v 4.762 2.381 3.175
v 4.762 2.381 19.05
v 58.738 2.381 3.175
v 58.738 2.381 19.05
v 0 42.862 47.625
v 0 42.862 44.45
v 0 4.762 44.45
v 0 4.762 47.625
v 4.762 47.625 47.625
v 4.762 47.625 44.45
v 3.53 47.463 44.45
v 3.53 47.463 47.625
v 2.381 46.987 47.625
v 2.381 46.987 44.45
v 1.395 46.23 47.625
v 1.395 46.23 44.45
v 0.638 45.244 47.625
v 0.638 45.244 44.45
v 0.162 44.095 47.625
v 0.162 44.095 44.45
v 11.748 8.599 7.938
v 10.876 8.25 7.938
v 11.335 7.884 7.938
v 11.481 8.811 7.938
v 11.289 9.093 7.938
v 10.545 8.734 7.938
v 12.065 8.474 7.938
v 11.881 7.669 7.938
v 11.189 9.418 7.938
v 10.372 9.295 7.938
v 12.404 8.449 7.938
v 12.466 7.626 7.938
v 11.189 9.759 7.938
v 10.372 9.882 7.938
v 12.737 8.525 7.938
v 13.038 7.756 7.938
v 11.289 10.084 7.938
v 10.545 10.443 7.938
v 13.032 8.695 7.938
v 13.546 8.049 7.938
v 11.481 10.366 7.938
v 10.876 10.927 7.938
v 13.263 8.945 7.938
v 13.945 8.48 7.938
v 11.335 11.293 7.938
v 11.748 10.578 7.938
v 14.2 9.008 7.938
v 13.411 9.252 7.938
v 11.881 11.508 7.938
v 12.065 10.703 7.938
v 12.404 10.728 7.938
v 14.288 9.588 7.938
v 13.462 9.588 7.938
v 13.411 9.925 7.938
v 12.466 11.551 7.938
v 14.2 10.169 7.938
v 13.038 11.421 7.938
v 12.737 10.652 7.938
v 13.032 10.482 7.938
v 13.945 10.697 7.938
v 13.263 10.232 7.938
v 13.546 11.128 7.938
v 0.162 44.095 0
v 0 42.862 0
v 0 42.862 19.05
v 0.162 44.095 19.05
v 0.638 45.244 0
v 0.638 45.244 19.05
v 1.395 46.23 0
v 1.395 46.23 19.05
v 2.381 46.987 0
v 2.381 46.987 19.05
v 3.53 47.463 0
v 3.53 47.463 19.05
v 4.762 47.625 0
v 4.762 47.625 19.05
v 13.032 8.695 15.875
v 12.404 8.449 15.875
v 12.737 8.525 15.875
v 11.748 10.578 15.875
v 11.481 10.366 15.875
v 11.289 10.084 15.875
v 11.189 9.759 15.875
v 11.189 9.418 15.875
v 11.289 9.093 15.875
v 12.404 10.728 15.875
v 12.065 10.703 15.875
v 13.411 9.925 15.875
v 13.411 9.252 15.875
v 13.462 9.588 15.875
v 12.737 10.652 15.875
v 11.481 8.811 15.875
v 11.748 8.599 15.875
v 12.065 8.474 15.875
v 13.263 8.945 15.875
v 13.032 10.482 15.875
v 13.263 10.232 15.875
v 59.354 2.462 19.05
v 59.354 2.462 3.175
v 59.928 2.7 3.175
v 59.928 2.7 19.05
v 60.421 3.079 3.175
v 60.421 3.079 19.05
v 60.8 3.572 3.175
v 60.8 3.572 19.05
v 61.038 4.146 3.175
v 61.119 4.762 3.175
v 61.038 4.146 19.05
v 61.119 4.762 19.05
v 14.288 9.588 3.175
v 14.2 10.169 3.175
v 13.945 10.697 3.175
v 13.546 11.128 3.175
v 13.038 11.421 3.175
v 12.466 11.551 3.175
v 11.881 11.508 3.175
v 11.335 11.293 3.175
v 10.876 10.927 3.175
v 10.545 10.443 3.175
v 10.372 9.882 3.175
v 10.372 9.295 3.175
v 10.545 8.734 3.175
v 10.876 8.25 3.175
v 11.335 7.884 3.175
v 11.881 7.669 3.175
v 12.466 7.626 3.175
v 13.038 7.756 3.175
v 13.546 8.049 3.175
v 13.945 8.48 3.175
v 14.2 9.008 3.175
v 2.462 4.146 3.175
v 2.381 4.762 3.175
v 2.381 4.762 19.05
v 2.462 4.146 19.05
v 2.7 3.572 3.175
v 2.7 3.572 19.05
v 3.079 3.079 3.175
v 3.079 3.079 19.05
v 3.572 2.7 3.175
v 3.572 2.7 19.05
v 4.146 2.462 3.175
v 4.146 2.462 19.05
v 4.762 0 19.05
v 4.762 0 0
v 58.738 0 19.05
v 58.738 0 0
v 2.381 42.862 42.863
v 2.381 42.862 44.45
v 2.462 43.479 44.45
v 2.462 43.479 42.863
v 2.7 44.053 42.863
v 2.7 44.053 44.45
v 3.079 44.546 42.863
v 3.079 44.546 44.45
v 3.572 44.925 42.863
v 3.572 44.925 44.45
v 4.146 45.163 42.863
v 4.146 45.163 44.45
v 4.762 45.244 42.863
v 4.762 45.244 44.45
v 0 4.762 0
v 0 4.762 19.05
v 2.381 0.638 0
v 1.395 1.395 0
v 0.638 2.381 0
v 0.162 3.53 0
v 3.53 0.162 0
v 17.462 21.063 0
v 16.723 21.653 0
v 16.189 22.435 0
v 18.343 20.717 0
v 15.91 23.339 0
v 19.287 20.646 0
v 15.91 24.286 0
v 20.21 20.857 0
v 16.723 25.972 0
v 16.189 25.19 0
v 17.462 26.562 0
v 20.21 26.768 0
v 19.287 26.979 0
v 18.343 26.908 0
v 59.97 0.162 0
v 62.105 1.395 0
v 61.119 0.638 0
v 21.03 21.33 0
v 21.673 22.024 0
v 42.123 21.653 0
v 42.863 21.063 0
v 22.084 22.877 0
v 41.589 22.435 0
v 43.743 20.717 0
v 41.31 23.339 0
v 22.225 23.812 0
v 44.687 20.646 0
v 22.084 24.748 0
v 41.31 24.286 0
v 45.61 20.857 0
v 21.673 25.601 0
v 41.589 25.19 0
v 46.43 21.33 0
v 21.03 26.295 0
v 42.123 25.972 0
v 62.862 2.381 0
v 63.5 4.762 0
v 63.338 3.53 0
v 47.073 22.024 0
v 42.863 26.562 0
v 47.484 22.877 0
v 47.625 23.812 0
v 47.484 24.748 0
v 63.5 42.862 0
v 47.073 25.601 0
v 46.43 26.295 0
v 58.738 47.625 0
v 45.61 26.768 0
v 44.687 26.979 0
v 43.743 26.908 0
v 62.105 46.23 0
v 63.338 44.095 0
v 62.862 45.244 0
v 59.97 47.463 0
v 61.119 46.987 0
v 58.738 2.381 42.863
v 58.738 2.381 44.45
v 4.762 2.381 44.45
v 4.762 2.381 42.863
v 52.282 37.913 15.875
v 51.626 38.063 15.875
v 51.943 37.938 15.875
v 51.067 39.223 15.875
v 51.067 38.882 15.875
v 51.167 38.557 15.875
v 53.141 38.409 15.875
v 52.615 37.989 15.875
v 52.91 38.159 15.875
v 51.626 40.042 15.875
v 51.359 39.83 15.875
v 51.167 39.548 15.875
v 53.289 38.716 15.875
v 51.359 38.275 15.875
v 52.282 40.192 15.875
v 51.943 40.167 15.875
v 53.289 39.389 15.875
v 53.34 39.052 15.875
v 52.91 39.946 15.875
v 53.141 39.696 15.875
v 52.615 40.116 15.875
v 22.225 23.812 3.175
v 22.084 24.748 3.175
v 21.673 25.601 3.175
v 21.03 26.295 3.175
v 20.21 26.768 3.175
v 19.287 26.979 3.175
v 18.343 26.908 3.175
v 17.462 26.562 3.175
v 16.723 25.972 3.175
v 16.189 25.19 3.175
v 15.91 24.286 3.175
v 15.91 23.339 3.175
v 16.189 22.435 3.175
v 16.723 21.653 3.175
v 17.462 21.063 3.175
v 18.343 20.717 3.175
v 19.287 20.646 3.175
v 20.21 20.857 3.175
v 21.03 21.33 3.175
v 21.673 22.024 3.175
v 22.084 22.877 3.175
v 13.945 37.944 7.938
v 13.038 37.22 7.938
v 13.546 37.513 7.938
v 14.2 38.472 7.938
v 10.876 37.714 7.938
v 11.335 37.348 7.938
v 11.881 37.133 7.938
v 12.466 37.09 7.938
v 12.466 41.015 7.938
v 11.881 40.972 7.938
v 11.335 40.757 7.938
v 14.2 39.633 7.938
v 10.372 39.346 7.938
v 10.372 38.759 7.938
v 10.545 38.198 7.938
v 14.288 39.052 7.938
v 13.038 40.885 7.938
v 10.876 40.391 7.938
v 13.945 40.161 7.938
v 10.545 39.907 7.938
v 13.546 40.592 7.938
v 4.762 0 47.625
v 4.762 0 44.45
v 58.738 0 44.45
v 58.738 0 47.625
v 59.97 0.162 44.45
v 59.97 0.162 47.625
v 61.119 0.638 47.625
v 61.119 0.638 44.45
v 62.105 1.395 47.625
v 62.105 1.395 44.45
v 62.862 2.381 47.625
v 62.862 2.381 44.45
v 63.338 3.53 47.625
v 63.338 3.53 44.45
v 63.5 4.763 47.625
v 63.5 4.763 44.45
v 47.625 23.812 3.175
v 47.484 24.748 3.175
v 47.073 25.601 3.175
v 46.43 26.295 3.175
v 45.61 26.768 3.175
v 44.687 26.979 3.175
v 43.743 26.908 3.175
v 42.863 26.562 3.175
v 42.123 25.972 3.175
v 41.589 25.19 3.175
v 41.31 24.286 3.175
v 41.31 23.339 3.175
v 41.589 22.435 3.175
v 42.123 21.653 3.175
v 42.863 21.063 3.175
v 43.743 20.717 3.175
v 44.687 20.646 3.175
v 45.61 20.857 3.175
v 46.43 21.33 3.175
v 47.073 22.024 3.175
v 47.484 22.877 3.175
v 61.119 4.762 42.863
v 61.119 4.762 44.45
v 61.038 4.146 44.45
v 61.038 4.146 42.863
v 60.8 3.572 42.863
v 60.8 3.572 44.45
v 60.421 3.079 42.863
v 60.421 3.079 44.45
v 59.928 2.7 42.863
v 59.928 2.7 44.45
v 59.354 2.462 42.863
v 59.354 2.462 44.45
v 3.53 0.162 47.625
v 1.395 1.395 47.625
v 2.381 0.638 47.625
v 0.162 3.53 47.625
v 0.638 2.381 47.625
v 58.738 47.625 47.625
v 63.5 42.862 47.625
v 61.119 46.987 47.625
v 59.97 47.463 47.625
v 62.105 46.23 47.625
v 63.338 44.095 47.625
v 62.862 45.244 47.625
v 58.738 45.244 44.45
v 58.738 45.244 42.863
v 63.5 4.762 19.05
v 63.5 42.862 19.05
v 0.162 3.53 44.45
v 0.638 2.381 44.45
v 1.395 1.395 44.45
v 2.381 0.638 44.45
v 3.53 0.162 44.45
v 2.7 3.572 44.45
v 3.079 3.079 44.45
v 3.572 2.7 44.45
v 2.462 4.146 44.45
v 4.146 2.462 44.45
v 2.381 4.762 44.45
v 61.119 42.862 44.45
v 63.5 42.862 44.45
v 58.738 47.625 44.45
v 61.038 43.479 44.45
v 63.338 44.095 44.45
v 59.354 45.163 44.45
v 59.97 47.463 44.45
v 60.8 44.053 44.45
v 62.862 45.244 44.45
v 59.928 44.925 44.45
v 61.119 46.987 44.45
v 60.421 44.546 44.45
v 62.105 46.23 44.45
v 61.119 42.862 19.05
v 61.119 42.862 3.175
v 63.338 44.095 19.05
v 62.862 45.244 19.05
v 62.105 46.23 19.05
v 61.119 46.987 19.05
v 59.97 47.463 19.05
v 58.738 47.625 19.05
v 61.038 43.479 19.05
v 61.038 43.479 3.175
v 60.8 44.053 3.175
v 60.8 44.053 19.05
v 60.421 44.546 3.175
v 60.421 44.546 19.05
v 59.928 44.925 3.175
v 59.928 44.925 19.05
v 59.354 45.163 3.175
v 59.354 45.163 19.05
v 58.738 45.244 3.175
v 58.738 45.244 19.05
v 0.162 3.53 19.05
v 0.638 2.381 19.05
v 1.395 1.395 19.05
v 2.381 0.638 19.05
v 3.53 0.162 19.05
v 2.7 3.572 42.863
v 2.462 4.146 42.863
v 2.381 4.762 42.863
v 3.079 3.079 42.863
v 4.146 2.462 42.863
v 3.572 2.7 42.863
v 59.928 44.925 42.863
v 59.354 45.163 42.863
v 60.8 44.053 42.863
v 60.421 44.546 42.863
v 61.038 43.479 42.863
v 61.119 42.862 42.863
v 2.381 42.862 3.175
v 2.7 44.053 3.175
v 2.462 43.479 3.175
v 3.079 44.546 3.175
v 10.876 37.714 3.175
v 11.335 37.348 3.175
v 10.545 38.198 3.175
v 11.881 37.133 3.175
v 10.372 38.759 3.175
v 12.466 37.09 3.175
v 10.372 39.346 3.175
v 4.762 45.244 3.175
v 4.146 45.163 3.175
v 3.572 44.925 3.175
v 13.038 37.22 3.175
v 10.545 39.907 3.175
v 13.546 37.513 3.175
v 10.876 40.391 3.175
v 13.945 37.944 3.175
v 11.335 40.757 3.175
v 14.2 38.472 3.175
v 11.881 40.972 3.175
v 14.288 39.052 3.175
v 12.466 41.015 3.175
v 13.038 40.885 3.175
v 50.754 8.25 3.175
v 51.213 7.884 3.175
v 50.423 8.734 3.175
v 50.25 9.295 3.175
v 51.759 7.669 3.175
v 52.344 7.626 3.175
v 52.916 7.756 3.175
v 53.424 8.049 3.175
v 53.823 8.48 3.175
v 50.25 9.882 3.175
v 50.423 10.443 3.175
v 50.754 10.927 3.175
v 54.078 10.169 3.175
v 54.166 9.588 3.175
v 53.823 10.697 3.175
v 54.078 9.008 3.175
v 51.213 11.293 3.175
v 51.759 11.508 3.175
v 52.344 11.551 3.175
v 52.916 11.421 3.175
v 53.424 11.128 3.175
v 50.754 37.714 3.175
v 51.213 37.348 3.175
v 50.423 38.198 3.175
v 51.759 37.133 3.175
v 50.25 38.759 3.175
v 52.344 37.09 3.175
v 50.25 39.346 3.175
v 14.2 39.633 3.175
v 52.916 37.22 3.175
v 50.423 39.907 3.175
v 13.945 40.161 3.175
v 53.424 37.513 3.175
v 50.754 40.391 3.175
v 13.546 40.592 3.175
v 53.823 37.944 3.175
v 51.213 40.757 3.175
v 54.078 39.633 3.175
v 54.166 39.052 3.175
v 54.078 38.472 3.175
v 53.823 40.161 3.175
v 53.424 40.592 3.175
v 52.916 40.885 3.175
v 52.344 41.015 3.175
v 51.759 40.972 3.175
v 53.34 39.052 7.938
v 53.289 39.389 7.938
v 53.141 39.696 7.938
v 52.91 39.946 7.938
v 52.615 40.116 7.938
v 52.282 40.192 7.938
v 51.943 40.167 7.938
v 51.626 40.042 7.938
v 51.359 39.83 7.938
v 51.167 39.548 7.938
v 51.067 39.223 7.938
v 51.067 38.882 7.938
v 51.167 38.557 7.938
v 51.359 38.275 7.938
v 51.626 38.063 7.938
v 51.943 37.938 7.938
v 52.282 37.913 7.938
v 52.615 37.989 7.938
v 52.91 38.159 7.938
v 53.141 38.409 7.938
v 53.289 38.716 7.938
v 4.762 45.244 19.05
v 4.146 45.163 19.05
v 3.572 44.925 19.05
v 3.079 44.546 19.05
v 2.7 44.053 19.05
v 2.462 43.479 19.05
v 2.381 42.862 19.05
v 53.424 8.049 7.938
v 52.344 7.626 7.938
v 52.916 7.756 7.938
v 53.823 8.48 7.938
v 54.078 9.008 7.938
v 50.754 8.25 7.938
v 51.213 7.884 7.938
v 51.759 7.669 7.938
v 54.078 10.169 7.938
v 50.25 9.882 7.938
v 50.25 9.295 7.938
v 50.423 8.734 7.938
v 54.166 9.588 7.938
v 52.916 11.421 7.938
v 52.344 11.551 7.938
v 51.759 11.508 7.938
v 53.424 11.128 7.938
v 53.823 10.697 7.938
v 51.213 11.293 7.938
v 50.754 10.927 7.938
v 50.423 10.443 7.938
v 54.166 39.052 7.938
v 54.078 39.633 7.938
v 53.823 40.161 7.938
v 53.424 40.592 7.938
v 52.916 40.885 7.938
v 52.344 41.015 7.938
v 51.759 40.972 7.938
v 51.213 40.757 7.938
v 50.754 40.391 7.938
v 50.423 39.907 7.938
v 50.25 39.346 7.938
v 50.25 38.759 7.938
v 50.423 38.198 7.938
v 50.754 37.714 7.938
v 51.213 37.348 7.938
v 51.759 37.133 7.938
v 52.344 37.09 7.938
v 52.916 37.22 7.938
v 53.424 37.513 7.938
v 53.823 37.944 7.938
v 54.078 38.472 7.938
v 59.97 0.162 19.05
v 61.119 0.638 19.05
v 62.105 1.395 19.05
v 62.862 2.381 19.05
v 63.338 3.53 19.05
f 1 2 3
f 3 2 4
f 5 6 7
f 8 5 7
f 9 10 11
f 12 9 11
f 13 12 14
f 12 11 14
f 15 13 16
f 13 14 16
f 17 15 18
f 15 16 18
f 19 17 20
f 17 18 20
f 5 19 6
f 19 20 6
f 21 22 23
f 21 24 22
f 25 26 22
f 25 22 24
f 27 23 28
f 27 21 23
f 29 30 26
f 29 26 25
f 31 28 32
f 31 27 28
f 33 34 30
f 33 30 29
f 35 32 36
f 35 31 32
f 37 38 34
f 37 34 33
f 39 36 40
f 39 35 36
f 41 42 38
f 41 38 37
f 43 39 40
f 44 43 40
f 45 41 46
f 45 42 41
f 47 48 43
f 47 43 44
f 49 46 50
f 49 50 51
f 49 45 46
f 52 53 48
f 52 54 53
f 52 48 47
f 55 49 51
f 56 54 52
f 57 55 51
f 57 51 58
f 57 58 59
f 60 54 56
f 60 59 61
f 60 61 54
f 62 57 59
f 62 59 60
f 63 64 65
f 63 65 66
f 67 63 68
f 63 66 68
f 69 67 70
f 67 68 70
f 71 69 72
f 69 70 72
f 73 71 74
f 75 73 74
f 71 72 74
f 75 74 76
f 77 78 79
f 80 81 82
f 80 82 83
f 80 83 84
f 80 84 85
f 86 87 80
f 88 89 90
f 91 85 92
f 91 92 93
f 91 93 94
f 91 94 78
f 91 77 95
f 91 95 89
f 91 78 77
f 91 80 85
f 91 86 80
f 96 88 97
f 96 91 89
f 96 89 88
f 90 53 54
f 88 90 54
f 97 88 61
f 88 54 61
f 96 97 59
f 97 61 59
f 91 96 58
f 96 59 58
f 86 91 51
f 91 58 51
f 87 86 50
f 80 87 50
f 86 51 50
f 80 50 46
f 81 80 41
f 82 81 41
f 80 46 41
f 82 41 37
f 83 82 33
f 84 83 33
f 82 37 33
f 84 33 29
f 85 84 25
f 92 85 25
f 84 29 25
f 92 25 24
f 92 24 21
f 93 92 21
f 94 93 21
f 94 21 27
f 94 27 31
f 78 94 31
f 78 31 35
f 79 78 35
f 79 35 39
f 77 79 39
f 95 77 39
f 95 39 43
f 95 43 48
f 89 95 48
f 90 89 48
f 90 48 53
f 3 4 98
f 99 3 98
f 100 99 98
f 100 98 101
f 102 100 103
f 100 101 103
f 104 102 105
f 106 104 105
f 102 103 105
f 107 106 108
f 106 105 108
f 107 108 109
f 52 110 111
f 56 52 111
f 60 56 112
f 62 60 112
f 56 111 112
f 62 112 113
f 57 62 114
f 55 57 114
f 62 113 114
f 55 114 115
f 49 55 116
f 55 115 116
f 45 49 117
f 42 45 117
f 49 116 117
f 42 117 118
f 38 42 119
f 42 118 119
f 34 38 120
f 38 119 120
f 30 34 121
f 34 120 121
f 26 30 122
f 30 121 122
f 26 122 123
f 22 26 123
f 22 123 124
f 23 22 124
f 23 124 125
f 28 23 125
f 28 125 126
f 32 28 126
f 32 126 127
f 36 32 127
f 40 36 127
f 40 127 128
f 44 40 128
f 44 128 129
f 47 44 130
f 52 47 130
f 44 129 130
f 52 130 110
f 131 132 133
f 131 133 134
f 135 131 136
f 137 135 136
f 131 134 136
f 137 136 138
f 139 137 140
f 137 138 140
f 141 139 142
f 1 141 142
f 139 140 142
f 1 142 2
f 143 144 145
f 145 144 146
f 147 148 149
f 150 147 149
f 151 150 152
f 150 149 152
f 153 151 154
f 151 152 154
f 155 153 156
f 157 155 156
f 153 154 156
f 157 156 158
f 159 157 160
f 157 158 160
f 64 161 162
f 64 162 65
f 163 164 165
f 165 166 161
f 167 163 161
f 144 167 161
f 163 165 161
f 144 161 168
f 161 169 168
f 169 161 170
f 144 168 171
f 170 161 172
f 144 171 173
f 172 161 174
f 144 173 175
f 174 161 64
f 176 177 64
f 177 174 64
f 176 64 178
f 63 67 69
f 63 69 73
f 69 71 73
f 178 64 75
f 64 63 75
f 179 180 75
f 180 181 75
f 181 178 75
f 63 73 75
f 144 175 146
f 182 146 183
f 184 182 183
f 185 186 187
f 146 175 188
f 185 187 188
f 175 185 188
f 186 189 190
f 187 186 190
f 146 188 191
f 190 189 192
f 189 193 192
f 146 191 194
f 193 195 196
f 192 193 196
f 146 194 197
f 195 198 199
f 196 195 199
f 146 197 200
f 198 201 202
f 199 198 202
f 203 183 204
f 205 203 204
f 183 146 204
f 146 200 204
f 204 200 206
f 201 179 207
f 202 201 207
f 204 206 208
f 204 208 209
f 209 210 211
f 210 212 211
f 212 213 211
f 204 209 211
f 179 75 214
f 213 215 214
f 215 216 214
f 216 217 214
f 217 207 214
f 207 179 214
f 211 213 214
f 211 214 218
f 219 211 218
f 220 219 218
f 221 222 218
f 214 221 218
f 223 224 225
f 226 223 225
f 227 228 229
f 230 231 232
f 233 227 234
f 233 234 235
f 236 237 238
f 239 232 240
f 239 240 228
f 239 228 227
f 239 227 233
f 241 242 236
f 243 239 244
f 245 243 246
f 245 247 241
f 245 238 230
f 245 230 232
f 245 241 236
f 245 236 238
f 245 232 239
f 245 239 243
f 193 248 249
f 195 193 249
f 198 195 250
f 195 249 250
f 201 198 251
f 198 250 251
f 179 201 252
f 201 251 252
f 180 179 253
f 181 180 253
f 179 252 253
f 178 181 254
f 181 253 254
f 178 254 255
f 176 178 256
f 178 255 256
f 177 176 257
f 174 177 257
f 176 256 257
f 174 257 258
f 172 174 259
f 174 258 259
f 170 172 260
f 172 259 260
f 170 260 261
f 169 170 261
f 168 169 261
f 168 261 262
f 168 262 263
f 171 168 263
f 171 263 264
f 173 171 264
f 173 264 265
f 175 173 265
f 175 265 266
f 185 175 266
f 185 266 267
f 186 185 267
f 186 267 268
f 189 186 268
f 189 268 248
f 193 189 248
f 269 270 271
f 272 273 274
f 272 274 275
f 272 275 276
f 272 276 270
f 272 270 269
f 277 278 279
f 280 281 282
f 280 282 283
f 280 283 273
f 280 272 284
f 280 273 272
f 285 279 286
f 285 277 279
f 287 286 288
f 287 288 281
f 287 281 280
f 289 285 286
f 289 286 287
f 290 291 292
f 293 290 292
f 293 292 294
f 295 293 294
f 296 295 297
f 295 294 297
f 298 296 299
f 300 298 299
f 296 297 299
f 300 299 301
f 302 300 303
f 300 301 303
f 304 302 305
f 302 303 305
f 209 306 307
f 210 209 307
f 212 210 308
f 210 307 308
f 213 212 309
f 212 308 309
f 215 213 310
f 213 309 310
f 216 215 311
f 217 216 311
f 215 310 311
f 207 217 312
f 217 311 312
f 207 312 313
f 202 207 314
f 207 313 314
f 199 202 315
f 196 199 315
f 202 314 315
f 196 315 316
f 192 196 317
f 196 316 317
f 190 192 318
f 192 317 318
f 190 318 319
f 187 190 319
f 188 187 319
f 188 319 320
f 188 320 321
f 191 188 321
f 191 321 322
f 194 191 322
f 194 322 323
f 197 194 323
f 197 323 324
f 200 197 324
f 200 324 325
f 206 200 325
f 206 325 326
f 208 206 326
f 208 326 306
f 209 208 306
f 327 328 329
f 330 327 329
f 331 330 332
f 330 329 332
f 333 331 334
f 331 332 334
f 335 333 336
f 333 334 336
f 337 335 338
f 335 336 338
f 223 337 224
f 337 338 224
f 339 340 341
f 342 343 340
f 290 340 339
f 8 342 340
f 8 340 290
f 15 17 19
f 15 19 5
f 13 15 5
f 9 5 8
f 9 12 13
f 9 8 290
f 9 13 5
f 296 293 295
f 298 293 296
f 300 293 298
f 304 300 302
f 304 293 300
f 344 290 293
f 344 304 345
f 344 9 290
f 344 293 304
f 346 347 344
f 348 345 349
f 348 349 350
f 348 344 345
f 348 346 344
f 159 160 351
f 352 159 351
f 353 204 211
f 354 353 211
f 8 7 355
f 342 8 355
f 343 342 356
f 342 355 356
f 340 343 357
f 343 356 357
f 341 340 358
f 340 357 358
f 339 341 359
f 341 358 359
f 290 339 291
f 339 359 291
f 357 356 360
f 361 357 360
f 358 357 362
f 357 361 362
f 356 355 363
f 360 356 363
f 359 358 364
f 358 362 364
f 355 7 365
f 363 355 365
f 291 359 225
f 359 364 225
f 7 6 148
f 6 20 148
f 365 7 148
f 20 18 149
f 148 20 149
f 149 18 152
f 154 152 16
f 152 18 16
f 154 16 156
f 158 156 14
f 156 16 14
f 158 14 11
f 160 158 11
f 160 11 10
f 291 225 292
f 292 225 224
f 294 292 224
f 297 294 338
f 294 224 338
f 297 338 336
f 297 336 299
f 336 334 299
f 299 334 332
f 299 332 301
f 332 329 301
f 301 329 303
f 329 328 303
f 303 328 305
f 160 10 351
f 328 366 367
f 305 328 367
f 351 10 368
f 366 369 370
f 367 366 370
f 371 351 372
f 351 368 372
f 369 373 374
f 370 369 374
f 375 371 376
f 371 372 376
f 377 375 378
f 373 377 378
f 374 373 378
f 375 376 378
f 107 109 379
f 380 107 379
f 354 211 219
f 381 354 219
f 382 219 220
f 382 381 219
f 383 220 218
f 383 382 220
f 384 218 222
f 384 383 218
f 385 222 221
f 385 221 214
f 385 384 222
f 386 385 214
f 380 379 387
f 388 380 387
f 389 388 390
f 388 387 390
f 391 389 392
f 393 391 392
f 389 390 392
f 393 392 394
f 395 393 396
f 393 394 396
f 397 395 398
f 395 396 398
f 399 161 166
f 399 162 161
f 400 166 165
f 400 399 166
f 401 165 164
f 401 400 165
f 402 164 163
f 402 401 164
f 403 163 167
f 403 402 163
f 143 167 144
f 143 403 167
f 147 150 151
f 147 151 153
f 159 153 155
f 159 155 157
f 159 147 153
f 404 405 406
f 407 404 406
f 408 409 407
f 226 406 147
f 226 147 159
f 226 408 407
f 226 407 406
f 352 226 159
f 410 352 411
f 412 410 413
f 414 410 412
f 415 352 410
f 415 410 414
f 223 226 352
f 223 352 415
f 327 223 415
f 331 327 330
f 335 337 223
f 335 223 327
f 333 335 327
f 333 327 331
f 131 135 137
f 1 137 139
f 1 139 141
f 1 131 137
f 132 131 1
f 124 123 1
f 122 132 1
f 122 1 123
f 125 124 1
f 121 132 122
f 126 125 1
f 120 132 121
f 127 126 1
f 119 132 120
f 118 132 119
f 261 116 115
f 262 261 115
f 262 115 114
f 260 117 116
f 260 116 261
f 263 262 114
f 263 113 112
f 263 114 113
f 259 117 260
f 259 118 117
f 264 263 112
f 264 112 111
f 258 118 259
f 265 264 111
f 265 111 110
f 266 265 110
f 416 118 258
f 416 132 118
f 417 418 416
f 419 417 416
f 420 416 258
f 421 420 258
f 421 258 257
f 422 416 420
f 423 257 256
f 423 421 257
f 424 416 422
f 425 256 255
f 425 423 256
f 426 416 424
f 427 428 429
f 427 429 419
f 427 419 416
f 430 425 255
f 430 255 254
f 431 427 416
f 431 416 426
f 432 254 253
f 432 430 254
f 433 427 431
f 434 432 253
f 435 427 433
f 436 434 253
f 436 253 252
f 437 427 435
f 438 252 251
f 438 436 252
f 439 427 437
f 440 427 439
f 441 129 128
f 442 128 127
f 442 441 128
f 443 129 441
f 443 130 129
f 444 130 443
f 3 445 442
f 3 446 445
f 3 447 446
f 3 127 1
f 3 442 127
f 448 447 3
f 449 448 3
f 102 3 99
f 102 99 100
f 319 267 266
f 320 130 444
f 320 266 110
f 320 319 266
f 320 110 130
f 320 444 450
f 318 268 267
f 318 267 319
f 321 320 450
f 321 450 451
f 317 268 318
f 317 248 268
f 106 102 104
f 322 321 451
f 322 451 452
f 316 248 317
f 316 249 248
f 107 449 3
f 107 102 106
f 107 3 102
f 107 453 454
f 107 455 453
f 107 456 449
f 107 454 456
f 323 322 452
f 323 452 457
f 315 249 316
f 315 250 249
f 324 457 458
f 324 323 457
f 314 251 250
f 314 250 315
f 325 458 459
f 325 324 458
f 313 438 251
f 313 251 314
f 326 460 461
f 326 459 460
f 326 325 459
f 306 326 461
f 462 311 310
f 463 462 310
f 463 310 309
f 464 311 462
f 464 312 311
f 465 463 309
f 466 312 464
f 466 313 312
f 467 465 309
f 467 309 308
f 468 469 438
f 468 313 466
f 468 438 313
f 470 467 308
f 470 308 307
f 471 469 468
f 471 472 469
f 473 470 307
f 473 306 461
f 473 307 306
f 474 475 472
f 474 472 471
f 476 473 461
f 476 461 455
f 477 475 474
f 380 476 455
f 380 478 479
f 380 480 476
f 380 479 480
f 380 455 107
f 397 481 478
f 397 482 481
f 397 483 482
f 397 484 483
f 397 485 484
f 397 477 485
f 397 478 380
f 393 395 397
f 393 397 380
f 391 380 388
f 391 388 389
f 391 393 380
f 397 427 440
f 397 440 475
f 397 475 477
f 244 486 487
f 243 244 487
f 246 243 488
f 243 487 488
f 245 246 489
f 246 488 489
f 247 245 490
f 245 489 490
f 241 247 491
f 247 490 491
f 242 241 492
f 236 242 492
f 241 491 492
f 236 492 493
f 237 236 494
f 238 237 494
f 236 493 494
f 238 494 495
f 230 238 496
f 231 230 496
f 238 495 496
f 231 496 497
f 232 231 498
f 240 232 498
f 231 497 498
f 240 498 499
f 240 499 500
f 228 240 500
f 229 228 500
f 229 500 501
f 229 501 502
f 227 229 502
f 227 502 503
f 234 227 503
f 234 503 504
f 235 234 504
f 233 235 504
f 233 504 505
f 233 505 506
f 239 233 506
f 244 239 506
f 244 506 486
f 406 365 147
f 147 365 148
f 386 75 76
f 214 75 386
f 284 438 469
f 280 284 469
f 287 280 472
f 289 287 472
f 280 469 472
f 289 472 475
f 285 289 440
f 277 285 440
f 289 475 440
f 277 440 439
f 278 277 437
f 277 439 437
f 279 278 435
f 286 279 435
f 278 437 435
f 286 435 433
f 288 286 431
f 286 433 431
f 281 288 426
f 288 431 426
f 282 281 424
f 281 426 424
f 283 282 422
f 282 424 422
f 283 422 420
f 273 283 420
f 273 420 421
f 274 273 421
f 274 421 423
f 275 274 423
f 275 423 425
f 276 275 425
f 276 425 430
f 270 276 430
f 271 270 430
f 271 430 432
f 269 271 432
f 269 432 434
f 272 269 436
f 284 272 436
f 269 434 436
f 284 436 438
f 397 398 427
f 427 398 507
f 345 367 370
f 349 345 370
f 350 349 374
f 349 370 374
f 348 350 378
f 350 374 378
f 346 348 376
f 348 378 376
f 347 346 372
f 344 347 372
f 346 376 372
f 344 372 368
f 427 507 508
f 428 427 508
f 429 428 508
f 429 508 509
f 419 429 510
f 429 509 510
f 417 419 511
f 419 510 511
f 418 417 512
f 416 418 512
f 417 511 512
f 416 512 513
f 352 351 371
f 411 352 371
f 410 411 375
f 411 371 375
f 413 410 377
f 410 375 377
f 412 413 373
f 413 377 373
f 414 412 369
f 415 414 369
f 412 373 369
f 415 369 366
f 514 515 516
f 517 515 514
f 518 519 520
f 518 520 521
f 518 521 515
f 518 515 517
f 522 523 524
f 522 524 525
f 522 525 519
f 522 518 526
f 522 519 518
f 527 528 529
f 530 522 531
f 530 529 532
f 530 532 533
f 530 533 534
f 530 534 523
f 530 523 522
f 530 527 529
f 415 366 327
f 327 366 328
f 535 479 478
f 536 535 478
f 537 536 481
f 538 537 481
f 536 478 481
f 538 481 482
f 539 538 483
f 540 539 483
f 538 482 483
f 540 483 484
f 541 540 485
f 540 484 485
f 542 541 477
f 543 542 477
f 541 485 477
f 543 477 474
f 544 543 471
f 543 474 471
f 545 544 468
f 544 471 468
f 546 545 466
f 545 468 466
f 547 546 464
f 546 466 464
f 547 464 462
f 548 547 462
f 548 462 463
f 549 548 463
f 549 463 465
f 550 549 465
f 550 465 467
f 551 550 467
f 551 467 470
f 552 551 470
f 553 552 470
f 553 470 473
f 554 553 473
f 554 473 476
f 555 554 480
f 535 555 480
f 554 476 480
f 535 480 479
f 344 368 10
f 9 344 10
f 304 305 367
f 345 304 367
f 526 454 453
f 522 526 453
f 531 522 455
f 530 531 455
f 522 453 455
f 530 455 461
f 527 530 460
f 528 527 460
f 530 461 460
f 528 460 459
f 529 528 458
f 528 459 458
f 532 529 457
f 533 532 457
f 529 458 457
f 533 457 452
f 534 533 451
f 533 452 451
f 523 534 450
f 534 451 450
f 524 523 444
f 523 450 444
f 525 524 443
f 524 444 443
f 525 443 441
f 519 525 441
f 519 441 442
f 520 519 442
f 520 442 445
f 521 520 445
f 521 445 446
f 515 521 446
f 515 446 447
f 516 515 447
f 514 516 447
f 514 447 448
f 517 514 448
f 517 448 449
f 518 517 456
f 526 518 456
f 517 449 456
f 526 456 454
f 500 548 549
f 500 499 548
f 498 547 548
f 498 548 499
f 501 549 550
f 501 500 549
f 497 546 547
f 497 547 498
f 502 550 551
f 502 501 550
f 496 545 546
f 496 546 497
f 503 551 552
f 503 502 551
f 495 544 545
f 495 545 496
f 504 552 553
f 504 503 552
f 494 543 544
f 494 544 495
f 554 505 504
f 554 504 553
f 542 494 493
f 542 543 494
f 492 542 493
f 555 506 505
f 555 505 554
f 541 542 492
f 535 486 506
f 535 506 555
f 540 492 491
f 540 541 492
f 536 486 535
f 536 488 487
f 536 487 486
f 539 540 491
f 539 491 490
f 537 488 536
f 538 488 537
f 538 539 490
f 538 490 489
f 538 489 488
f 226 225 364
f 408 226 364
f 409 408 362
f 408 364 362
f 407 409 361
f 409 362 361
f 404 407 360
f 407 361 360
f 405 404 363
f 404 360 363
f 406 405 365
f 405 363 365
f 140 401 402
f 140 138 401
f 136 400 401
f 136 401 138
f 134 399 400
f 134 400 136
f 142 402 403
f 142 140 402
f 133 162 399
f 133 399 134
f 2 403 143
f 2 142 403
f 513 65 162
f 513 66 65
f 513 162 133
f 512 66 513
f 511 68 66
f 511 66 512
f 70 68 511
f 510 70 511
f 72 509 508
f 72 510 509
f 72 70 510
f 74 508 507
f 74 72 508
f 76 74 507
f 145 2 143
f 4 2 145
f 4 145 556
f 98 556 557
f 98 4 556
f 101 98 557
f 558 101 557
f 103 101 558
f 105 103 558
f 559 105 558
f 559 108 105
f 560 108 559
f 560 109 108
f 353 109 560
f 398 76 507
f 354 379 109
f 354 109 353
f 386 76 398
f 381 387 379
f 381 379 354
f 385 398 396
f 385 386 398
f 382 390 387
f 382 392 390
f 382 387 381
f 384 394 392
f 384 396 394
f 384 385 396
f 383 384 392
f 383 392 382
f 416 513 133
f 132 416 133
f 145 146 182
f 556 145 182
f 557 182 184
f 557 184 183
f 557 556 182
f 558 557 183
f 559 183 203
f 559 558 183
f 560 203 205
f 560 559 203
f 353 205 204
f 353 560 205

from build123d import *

# Parameters (mm, degrees)
F0_W      = 63.5
F0_H      = 47.625
F1_DEPTH  = 19.05
F2_R      = 4.7625
F4_DEPTH  = 15.875
F5_R      = 1.143
F6_DEPTH  = 12.7
F7_R      = 1.9685
F8_DEPTH  = 4.7625
F9_R      = 3.175
F10_DEPTH = 25.4
F13_DEPTH = 3.175
F15_DEPTH = 1.5875


with BuildPart() as f1:
    # F0 (on Top) → F1 (new body)
    with BuildSketch(Plane.XY):
        with Locations((31.75, 23.8125)):
            Rectangle(F0_W, F0_H)
    extrude(amount=F1_DEPTH)

    # F2
    f2_edges = [f1.edges().sort_by_distance(p)[0] for p in [
        (0, 0, 9.525),
        (63.5, 0, 9.525),
        (63.5, 47.625, 9.525),
        (0, 47.625, 9.525),
    ]]
    fillet(f2_edges, radius=F2_R)

    # F3 (on face) → F4 (cut)
    with BuildSketch(Plane.XY.offset(19.05)):
        with BuildLine():
            ThreePointArc((61.11875, 42.8625), (60.4212980227, 44.5462980227), (58.7375, 45.24375))
            Line((58.7375, 45.24375), (4.7625, 45.24375))
            ThreePointArc((4.7625, 45.24375), (3.0787019773, 44.5462980227), (2.38125, 42.8625))
            Line((2.38125, 42.8625), (2.38125, 4.7625))
            ThreePointArc((2.38125, 4.7625), (3.0787019773, 3.0787019773), (4.7625, 2.38125))
            Line((4.7625, 2.38125), (58.7375, 2.38125))
            ThreePointArc((58.7375, 2.38125), (60.4212980227, 3.0787019773), (61.11875, 4.7625))
            Line((61.11875, 4.7625), (61.11875, 42.8625))
        make_face()
    extrude(amount=-F4_DEPTH, mode=Mode.SUBTRACT)

    # F5 (on face) → F6 (join)
    with BuildSketch(Plane.XY.offset(3.175)):
        with Locations((12.319, 9.5885)):
            Circle(F5_R)
        with Locations((52.197, 39.0525)):
            Circle(F5_R)
    extrude(amount=F6_DEPTH)

    # F7 (on face) → F8 (join)
    with BuildSketch(Plane.XY.offset(3.175)):
        with Locations((12.319, 9.5885)):
            Circle(F7_R)
        with Locations((52.197, 39.0525)):
            Circle(F7_R)
        with Locations((12.319, 39.0525)):
            Circle(F7_R)
        with Locations((52.197, 9.5885)):
            Circle(F7_R)
    extrude(amount=F8_DEPTH)

    # F9 (on face) → F10 (cut)
    with BuildSketch(Plane.XY.offset(3.175)):
        with Locations((44.45, 23.8125)):
            Circle(F9_R)
        with Locations((19.05, 23.8125)):
            Circle(F9_R)
    extrude(amount=-F10_DEPTH, mode=Mode.SUBTRACT)


with BuildPart() as f13:
    # F12 (on offset) → F13 (new body)
    with BuildSketch(Plane.XY.offset(44.45)):
        with BuildLine():
            Line((0, 42.8625), (0, 4.7625))
            ThreePointArc((0, 4.7625), (1.3949039546, 1.3949039546), (4.7625, 0))
            Line((4.7625, 0), (58.7375, 0))
            ThreePointArc((58.7375, 0), (62.1050960454, 1.3949039546), (63.5, 4.7625))
            Line((63.5, 4.7625), (63.5, 42.8625))
            ThreePointArc((63.5, 42.8625), (62.1050960454, 46.2300960454), (58.7375, 47.625))
            Line((58.7375, 47.625), (4.7625, 47.625))
            ThreePointArc((4.7625, 47.625), (1.3949039546, 46.2300960454), (0, 42.8625))
        make_face()
    extrude(amount=F13_DEPTH)

    # F14 (on face) → F15 (join)
    with BuildSketch(Plane(origin=(0, 0, 44.45), x_dir=(1, 0, 0), z_dir=(0, 0, -1))):
        with BuildLine():
            Line((4.7625, -45.24375), (58.7375, -45.24375))
            ThreePointArc((58.7375, -45.24375), (60.4212980227, -44.5462980227), (61.11875, -42.8625))
            Line((61.11875, -42.8625), (61.11875, -4.7625))
            ThreePointArc((61.11875, -4.7625), (60.4212980227, -3.0787019773), (58.7375, -2.38125))
            Line((58.7375, -2.38125), (4.7625, -2.38125))
            ThreePointArc((4.7625, -2.38125), (3.0787019773, -3.0787019773), (2.38125, -4.7625))
            Line((2.38125, -4.7625), (2.38125, -42.8625))
            ThreePointArc((2.38125, -42.8625), (3.0787019773, -44.5462980227), (4.7625, -45.24375))
        make_face()
    extrude(amount=F15_DEPTH)


solid = Compound([f1.part, f13.part])
